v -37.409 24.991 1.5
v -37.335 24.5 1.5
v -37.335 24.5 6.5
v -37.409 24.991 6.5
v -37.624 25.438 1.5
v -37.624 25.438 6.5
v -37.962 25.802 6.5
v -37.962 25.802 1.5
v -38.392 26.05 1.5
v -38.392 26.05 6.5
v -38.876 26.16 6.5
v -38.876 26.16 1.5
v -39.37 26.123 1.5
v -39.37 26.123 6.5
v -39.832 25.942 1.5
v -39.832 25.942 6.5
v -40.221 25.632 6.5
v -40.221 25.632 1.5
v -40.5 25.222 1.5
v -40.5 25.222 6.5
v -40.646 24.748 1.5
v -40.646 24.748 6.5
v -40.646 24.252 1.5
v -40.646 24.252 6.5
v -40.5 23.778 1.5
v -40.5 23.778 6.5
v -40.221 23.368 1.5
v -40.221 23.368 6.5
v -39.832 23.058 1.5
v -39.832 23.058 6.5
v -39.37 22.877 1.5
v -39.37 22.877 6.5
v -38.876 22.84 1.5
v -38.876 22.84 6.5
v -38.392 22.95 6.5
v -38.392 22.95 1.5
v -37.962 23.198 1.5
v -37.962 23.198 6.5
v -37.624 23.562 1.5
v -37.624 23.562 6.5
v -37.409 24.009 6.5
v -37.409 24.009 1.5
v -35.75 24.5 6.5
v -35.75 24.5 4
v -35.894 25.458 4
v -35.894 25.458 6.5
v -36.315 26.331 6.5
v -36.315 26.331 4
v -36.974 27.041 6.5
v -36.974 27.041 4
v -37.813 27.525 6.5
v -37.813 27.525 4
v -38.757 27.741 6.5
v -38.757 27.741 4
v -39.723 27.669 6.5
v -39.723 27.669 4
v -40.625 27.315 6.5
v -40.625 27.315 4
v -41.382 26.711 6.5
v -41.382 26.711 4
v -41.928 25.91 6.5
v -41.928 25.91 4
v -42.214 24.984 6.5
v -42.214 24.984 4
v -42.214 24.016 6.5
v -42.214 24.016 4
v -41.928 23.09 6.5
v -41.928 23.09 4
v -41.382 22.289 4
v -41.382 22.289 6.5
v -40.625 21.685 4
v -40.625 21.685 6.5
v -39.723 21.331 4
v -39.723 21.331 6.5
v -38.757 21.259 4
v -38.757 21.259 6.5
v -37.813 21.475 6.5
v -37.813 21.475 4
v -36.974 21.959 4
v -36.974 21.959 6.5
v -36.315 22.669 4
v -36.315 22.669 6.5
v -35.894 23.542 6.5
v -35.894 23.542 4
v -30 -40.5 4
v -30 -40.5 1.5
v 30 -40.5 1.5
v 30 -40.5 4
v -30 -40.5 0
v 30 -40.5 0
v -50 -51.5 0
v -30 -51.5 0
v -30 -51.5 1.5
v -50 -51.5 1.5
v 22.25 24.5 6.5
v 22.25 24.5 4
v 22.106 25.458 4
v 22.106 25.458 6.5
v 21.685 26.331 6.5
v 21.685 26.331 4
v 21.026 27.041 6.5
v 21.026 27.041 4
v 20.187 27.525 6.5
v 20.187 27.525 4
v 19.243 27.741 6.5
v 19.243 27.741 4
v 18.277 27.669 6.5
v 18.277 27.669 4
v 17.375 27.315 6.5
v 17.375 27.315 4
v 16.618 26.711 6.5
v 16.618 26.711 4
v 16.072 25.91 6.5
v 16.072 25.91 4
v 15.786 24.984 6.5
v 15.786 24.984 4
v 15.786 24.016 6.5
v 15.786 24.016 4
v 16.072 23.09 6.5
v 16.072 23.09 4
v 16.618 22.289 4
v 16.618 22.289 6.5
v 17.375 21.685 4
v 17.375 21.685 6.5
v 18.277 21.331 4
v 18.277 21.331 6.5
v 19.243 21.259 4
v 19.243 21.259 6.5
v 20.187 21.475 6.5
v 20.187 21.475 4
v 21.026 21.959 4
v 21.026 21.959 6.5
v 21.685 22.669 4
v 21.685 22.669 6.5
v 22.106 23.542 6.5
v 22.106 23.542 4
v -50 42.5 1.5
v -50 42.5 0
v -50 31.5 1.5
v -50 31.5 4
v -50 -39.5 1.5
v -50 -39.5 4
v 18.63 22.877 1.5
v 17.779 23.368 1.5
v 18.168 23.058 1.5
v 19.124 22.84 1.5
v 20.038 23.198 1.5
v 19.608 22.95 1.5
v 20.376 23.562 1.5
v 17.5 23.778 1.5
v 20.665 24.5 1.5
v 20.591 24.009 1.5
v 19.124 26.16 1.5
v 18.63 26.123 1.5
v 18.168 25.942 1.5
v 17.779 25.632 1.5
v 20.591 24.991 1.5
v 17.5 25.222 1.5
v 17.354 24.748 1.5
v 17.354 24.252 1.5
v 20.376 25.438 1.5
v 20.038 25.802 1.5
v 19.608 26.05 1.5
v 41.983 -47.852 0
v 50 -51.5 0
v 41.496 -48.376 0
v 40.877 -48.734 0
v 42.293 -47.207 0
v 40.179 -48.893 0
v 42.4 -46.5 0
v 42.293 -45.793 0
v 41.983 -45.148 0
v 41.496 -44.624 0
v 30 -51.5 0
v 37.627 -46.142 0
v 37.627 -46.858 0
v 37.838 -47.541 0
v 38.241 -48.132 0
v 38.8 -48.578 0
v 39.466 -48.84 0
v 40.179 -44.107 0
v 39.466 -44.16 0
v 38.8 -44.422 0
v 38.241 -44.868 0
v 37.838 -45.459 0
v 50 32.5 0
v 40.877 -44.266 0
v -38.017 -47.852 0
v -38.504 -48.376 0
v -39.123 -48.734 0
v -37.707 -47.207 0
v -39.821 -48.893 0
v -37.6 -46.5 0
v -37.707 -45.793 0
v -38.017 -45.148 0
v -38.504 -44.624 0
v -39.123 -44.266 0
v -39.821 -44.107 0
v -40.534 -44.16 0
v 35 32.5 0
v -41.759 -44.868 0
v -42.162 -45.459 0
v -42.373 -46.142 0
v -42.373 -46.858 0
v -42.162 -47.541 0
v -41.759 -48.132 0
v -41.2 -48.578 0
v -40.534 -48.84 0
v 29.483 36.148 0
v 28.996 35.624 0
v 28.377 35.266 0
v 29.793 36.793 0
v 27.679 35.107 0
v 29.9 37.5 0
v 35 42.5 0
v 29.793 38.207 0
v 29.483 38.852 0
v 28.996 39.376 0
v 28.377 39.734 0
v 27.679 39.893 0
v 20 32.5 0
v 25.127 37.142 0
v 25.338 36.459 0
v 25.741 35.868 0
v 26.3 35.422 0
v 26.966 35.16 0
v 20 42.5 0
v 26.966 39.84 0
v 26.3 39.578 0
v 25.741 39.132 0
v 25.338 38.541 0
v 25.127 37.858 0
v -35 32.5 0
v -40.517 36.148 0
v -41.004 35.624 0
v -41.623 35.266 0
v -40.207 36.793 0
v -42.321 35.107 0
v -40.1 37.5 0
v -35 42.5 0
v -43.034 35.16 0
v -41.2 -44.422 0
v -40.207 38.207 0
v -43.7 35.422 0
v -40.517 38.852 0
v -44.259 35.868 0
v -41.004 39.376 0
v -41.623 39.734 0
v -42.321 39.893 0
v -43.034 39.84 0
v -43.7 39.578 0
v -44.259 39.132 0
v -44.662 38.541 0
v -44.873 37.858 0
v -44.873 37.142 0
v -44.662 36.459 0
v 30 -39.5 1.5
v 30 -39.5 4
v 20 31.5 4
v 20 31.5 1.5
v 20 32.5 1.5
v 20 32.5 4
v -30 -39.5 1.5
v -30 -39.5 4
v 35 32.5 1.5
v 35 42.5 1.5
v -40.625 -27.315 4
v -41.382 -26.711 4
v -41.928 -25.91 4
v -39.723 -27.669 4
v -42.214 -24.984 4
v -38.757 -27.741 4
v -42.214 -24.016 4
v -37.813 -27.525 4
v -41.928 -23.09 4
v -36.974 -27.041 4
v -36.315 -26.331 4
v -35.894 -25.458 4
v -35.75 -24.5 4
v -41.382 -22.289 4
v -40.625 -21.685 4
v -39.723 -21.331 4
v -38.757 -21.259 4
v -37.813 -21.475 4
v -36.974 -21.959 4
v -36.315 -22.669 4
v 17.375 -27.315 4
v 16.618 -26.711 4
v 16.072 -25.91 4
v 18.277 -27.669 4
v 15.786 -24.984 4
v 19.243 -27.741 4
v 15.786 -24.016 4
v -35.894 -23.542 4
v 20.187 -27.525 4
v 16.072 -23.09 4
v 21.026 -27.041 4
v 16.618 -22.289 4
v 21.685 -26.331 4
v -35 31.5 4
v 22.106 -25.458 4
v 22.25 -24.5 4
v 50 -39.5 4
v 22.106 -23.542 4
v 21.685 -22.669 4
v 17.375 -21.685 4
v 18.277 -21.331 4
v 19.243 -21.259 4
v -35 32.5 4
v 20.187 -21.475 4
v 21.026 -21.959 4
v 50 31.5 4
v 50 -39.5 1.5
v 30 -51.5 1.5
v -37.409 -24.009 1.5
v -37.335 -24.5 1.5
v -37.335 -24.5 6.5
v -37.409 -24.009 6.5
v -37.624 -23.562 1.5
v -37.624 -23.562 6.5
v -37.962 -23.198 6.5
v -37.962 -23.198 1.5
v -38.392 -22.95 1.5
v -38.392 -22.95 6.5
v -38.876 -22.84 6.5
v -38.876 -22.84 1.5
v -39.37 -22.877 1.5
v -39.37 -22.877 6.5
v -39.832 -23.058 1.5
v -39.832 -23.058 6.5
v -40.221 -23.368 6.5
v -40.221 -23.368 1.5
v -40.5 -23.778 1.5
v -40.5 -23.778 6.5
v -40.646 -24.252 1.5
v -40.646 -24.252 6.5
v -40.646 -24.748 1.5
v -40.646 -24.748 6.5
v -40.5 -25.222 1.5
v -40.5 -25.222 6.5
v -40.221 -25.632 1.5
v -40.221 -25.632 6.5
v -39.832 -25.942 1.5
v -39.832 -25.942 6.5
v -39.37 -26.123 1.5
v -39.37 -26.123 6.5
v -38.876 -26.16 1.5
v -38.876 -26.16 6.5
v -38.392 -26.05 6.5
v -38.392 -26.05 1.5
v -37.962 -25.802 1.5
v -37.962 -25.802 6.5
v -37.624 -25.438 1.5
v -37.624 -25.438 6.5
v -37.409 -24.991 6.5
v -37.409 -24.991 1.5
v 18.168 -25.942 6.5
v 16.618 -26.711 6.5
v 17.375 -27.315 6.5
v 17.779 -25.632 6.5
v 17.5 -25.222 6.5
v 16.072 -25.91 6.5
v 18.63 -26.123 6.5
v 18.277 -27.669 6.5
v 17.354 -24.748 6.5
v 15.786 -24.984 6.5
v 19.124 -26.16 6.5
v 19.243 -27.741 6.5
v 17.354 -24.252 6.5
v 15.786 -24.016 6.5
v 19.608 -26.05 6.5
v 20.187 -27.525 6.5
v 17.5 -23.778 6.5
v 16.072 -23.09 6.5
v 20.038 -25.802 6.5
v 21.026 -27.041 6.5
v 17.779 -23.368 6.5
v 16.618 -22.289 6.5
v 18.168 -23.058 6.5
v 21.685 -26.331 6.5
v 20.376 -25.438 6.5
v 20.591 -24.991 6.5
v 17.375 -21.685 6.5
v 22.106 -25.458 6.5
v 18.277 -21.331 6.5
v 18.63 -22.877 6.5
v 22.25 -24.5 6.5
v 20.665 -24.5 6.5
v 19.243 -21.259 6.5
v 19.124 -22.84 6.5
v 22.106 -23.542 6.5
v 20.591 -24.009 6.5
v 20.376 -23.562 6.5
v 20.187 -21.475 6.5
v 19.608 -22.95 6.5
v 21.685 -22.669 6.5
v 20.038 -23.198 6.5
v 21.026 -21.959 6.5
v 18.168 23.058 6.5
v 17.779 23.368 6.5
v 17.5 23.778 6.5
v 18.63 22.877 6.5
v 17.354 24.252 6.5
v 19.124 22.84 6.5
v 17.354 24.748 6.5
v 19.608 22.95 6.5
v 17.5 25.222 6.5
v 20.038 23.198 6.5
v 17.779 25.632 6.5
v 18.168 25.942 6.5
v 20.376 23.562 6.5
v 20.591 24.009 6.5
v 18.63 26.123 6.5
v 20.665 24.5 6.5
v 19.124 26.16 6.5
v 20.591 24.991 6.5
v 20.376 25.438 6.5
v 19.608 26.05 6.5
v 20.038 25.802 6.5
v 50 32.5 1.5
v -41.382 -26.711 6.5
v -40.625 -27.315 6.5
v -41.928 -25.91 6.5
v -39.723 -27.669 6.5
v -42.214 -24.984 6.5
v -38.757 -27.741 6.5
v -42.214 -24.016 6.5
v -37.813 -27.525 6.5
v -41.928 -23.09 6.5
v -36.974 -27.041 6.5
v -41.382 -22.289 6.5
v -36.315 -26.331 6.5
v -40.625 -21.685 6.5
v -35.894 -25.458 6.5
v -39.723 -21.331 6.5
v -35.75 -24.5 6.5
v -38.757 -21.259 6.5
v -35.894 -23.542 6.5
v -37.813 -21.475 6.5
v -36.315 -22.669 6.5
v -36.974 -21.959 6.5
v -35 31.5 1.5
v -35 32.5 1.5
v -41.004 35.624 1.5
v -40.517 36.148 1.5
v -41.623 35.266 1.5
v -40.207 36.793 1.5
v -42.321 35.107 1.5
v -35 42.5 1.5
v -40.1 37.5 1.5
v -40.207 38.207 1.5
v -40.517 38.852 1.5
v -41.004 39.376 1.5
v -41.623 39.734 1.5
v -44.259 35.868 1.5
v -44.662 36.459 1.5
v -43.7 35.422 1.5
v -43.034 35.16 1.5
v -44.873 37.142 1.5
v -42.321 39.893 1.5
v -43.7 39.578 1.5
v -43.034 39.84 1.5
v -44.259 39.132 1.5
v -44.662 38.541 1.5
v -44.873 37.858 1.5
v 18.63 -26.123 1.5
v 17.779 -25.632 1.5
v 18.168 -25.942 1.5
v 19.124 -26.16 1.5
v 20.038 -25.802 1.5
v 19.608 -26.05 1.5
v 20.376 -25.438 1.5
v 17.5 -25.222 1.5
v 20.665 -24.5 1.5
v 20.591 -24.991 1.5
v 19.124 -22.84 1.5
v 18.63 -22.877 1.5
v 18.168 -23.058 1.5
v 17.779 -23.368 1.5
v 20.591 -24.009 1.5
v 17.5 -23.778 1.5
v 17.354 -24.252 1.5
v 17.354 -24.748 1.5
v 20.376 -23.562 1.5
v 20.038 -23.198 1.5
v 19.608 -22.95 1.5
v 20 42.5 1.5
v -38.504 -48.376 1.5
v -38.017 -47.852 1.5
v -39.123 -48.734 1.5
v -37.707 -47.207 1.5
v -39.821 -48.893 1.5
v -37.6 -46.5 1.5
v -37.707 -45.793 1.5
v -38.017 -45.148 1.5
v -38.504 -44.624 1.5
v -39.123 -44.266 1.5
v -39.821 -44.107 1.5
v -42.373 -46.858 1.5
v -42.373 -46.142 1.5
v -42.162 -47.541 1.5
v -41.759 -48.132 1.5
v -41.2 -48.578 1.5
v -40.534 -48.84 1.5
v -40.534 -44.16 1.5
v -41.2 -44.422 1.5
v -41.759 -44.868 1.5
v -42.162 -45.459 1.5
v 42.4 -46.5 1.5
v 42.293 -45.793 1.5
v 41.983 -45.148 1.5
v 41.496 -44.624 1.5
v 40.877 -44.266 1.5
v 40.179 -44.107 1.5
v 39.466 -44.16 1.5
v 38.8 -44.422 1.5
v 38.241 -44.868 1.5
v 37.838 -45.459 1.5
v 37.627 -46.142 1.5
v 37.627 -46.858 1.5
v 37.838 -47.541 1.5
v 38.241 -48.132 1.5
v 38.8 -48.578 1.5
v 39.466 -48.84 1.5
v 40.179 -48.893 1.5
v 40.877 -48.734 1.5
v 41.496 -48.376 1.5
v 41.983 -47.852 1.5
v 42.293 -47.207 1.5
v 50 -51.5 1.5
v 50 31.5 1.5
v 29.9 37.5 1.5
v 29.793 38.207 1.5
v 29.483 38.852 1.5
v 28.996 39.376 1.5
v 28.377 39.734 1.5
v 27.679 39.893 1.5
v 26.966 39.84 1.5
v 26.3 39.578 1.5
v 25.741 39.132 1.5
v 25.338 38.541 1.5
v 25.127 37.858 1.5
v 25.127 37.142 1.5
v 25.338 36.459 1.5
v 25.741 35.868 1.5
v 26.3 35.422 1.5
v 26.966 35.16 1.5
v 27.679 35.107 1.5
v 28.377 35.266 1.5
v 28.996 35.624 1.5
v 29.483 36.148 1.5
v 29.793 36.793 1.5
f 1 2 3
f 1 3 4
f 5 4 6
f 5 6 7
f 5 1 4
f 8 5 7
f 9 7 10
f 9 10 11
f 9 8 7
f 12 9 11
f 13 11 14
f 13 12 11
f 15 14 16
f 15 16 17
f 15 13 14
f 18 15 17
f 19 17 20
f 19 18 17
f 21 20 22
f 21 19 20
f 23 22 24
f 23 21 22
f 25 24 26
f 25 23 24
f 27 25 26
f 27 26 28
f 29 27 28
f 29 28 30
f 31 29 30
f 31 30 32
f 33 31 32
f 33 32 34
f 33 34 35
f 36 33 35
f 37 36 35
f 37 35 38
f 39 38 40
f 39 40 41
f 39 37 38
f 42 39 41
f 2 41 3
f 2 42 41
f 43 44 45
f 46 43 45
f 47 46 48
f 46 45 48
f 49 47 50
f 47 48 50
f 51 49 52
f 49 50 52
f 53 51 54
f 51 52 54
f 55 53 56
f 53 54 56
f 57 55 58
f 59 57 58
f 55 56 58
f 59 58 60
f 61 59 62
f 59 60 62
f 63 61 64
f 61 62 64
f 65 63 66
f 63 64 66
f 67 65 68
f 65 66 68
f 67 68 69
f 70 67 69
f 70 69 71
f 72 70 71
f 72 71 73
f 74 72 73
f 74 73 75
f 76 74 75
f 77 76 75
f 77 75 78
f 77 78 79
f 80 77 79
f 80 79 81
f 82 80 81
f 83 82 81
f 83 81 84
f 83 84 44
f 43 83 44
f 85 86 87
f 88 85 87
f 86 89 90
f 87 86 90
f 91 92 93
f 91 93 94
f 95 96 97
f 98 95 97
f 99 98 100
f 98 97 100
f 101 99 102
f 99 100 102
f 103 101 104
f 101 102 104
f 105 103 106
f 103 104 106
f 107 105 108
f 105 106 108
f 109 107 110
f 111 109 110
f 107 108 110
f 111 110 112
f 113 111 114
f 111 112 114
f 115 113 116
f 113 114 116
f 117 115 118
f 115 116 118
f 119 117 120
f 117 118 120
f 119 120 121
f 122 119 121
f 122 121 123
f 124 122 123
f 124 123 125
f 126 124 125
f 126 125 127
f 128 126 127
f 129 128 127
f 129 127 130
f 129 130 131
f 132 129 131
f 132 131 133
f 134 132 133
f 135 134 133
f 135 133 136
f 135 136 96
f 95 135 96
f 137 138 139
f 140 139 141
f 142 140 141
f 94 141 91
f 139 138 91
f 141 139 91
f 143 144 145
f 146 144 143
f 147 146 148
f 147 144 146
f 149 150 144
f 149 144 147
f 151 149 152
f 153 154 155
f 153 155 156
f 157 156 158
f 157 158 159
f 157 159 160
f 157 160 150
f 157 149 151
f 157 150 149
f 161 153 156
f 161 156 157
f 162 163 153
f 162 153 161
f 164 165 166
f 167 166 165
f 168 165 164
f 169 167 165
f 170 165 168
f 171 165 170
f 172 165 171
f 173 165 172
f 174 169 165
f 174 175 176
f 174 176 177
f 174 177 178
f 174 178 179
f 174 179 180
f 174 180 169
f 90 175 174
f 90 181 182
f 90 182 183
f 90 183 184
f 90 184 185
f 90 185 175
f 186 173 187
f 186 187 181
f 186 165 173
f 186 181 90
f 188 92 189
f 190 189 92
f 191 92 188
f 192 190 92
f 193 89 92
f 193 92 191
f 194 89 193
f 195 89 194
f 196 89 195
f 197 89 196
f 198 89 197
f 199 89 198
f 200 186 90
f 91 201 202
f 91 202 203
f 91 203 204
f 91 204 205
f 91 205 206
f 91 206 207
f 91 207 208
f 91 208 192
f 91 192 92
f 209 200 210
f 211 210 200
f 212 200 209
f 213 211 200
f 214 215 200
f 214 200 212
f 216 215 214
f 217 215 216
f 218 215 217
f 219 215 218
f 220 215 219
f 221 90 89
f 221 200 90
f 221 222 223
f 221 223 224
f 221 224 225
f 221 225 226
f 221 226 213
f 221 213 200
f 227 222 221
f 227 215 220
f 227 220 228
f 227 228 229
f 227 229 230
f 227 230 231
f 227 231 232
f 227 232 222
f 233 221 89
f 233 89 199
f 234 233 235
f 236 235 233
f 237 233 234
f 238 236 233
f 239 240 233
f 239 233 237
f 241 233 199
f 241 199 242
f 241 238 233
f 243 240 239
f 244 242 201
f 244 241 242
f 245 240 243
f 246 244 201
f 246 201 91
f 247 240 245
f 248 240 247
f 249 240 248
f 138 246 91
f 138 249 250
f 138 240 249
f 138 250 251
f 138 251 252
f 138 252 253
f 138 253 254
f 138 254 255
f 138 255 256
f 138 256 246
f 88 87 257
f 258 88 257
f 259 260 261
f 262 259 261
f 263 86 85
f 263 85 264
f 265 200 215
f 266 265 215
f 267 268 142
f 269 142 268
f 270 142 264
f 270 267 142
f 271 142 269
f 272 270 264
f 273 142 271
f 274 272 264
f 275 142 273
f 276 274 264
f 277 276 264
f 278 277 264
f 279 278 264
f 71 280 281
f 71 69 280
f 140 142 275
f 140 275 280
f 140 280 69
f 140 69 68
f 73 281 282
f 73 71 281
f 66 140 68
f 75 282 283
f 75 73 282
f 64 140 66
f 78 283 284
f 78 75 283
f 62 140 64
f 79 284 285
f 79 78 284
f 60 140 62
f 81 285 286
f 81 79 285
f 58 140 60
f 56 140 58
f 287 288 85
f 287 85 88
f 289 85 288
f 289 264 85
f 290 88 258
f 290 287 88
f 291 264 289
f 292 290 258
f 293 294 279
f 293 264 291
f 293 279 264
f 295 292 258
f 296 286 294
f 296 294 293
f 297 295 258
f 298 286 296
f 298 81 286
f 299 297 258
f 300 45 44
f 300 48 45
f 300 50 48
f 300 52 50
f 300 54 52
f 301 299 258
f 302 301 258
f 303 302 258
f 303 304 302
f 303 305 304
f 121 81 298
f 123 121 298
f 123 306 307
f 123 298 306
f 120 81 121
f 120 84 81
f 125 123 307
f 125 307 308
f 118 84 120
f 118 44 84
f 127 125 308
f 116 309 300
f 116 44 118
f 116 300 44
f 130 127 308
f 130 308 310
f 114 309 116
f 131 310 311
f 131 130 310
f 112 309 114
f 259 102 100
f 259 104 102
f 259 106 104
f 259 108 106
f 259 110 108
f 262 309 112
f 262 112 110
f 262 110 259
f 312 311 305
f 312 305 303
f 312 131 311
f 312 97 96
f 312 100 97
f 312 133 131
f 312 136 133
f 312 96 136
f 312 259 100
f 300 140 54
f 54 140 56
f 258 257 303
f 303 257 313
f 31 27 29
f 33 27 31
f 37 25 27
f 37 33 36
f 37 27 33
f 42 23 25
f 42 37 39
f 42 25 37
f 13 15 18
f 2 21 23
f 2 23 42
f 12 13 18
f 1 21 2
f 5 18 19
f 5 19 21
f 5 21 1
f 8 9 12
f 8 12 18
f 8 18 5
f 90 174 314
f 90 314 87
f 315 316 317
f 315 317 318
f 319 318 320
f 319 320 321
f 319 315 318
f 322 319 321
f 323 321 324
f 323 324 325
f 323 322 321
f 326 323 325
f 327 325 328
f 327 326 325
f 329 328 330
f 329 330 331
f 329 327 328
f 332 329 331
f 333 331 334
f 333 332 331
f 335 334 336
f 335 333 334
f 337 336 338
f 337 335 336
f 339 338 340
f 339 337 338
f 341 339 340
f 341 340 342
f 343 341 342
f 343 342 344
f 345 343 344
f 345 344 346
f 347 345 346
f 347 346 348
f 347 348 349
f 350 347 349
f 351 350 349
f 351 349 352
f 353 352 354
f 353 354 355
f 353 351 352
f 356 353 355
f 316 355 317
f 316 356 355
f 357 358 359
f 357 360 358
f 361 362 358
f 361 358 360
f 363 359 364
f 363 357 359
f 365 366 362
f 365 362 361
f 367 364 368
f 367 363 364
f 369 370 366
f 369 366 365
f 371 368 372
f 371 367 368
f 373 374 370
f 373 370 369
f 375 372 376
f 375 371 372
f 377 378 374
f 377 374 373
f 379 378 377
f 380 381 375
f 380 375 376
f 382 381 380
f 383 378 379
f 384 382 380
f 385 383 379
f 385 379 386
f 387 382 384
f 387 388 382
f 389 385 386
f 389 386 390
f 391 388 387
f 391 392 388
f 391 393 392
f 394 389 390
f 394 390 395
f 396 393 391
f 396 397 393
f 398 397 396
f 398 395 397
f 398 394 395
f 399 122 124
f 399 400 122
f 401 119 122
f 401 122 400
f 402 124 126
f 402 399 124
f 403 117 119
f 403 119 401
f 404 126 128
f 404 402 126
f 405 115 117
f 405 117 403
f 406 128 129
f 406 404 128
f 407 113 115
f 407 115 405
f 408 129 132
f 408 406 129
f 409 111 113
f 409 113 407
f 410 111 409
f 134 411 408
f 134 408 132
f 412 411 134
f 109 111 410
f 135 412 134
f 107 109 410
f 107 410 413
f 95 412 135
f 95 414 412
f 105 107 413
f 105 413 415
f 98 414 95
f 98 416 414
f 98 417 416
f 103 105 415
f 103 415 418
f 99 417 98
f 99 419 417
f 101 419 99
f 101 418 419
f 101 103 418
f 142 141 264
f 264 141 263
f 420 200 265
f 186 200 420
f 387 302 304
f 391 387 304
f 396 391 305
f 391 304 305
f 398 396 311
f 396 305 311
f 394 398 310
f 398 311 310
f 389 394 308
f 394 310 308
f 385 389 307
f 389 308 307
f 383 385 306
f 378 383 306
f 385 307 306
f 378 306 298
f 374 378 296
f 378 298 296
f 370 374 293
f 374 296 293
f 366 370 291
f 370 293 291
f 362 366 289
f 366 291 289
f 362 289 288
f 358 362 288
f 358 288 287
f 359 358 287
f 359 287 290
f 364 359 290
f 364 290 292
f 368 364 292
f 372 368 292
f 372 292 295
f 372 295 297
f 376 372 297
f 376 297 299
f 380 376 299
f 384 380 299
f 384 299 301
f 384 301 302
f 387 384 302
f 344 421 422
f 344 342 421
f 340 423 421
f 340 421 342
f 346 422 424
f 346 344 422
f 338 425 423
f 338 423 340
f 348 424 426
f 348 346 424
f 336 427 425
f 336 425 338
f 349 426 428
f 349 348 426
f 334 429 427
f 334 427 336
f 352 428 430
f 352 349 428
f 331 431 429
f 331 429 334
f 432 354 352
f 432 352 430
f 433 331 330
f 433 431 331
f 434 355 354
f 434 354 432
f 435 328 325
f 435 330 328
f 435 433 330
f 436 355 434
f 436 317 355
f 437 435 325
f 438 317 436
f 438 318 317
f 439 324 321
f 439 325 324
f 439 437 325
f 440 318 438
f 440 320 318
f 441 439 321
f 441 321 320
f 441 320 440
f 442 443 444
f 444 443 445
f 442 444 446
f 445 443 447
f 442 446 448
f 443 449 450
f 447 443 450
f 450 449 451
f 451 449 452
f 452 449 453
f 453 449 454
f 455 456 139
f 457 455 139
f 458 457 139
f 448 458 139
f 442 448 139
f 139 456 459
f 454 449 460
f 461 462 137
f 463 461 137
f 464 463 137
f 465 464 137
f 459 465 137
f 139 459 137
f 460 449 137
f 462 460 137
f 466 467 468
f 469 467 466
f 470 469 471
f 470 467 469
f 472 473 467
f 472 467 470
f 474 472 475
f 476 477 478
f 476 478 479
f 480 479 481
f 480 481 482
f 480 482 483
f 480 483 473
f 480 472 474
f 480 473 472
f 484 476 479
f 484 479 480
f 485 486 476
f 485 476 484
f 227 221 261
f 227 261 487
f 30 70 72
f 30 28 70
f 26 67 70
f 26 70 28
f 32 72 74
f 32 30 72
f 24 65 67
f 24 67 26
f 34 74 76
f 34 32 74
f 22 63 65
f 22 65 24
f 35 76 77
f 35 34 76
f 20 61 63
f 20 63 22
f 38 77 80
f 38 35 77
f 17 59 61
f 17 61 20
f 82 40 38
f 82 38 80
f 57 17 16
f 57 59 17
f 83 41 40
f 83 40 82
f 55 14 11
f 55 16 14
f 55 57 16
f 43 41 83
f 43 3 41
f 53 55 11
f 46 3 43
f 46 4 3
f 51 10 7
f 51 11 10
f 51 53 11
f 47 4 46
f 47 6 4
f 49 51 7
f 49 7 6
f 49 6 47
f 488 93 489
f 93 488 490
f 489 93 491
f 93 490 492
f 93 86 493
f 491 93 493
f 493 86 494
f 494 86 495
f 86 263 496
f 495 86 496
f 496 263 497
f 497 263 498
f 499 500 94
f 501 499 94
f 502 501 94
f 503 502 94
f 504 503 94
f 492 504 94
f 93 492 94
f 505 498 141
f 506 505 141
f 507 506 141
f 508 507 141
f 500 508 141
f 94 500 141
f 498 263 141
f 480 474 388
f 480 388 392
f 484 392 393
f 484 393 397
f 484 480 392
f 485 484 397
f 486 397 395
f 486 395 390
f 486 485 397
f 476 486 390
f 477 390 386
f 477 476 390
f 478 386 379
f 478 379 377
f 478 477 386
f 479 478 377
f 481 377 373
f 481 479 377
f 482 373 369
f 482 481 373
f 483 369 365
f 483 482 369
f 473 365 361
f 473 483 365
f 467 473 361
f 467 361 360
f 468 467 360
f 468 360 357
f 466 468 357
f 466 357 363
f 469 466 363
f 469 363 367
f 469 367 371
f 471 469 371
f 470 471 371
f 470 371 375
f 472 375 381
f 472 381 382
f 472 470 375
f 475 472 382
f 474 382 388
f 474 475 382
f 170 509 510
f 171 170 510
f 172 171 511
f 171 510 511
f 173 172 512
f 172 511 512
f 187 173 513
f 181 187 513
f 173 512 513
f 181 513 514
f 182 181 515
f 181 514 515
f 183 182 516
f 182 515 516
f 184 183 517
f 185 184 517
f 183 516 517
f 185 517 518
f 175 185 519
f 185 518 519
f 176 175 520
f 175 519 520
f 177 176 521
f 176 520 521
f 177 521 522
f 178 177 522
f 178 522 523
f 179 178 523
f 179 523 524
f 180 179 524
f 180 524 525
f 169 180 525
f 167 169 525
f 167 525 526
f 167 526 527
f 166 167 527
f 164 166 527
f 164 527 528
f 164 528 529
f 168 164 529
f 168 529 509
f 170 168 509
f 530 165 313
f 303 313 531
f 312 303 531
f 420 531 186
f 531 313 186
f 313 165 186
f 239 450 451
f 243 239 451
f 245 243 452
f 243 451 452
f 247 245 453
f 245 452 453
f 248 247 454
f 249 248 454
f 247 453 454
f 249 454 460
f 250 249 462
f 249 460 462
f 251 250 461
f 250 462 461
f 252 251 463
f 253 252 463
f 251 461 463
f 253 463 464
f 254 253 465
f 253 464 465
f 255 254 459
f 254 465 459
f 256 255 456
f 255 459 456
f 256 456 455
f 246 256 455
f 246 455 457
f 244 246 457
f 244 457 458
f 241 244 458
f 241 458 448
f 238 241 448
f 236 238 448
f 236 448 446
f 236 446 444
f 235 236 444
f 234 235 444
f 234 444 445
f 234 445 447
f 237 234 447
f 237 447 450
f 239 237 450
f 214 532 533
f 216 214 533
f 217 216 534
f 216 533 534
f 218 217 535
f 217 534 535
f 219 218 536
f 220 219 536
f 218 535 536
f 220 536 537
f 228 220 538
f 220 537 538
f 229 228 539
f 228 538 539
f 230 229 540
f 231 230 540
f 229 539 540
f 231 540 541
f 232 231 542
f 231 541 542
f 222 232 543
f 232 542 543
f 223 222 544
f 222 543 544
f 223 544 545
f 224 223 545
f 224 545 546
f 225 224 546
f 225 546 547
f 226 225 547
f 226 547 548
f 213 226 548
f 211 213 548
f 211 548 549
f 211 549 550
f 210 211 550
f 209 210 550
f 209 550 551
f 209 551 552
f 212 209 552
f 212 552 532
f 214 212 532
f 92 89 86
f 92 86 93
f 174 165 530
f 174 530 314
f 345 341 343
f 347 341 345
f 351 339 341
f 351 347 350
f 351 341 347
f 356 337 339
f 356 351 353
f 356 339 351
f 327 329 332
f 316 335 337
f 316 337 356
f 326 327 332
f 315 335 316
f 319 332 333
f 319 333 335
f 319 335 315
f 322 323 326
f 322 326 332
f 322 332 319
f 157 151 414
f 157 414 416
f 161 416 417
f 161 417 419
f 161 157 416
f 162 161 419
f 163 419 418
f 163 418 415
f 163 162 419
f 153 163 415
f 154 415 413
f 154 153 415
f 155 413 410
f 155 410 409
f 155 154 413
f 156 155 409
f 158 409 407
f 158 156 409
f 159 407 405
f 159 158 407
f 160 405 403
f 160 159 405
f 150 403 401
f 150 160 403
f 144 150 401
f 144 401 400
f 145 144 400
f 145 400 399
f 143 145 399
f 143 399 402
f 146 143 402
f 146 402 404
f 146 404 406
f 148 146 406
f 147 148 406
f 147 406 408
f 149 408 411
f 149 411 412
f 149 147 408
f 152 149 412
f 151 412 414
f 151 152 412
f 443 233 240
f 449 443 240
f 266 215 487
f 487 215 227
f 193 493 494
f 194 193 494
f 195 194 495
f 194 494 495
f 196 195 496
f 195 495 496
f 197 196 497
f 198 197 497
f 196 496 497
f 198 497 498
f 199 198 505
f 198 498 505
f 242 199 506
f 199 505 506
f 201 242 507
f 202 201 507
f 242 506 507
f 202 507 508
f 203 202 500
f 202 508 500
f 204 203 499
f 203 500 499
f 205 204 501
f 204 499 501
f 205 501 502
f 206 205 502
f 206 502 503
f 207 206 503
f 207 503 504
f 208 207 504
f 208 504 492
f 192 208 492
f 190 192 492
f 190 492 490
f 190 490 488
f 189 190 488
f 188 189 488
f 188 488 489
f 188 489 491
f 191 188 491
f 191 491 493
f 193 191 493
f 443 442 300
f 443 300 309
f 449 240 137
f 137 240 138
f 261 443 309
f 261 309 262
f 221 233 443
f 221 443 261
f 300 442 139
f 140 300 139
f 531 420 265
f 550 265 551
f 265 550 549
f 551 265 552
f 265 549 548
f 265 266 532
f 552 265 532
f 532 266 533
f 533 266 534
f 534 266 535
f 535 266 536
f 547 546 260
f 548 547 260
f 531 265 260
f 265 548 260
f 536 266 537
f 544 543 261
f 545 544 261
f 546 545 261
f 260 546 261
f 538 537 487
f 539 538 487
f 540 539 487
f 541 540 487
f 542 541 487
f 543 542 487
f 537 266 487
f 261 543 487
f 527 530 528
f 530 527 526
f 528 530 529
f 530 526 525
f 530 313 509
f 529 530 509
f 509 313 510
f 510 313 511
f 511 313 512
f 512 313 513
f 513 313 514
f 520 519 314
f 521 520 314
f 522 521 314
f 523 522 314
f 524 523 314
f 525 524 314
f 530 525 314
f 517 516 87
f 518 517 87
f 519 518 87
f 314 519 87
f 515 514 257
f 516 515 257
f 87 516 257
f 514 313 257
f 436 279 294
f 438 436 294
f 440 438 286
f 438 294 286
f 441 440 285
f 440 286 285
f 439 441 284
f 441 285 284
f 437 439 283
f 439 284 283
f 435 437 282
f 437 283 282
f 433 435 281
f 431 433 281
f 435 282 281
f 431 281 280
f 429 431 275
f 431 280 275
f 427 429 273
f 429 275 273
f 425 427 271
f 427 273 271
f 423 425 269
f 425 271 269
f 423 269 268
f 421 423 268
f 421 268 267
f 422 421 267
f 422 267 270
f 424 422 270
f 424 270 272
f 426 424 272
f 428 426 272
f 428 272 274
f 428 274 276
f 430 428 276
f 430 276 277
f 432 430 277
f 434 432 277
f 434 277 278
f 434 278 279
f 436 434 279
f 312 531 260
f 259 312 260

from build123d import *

# Parameters (mm, degrees)
SKETCH1_W            = 100
SKETCH1_H            = 65
BOSS_EXTRUDE1_DEPTH  = 1.5
SKETCH2_R            = 3.25
SKETCH2_R_2          = 1.665
BOSS_EXTRUDE2_DEPTH  = 5
SKETCH4_W            = 15
SKETCH4_H            = 10
BOSS_EXTRUDE3_DEPTH  = 1.5
M4_CLEARANCE_HOLE1_D = 4.8
SKETCH8_R            = 3.25
SKETCH8_W            = 55
SKETCH8_H            = 1
SKETCH8_W_2          = 60
BOSS_EXTRUDE4_DEPTH  = 2.5


with BuildPart() as part:
    # Sketch1 → Boss-Extrude1 (new body)
    with BuildSketch(Plane.XY):
        Rectangle(SKETCH1_W, SKETCH1_H)
    extrude(amount=BOSS_EXTRUDE1_DEPTH)

    # Sketch2 → Boss-Extrude2 (add)
    # profile 1 of 4: a face of its own
    with BuildSketch(Plane.XY.offset(1.5)):
        with Locations((-39, 24.5)):
            Circle(SKETCH2_R)
        with Locations((-39, 24.5)):
            Circle(SKETCH2_R_2, mode=Mode.SUBTRACT)
    # profile 2 of 4: a face of its own
    with BuildSketch(Plane.XY.offset(1.5)):
        with Locations((19, 24.5)):
            Circle(SKETCH2_R)
        with Locations((19, 24.5)):
            Circle(SKETCH2_R_2, mode=Mode.SUBTRACT)
    # profile 3 of 4: a face of its own
    with BuildSketch(Plane.XY.offset(1.5)):
        with Locations((19, -24.5)):
            Circle(SKETCH2_R)
        with Locations((19, -24.5)):
            Circle(SKETCH2_R_2, mode=Mode.SUBTRACT)
    # profile 4 of 4: a face of its own
    with BuildSketch(Plane.XY.offset(1.5)):
        with Locations((-39, -24.5)):
            Circle(SKETCH2_R)
        with Locations((-39, -24.5)):
            Circle(SKETCH2_R_2, mode=Mode.SUBTRACT)
    extrude(amount=BOSS_EXTRUDE2_DEPTH)

    # Sketch4 → Boss-Extrude3 (add)
    with BuildSketch(Plane(origin=(0, 0, 0), x_dir=(-1, 0, 0), z_dir=(0, 0, -1))):
        Polygon((-50, -32.5), (-50, -51.5), (-30, -51.5), (-30, -40.5), (30, -40.5), (30, -51.5), (50, -51.5), (50, -32.5), align=None)
        with Locations((-27.5, 37.5)):
            Rectangle(SKETCH4_W, SKETCH4_H)
        with Locations((42.5, 37.5)):
            Rectangle(SKETCH4_W, SKETCH4_H)
    extrude(amount=-BOSS_EXTRUDE3_DEPTH)

    # M4 Clearance Hole1 (through all)
    with Locations(Plane(origin=(0, 0, 0), x_dir=(-1, 0, 0), z_dir=(0, 0, -1))):
        with Locations((-40, -46.5), (40, -46.5), (42.5, 37.5), (-27.5, 37.5)):
            Hole(M4_CLEARANCE_HOLE1_D / 2)

    # Sketch8 → Boss-Extrude4 (add)
    # profile 1 of 3: a face of its own
    with BuildSketch(Plane.XY.offset(1.5)):
        Polygon((-35, 31.5), (-50, 31.5), (-50, -39.5), (-30, -39.5), (30, -39.5), (50, -39.5), (50, 31.5), (35, 31.5), (20, 31.5), align=None)
        with Locations((-39, -24.5)):
            Circle(SKETCH8_R, mode=Mode.SUBTRACT)
        with Locations((19, -24.5)):
            Circle(SKETCH8_R, mode=Mode.SUBTRACT)
        with Locations((-39, 24.5)):
            Circle(SKETCH8_R, mode=Mode.SUBTRACT)
        with Locations((19, 24.5)):
            Circle(SKETCH8_R, mode=Mode.SUBTRACT)
    # profile 2 of 3: a face of its own
    with BuildSketch(Plane.XY.offset(1.5)):
        with Locations((-7.5, 32)):
            Rectangle(SKETCH8_W, SKETCH8_H)
    # profile 3 of 3: a face of its own
    with BuildSketch(Plane.XY.offset(1.5)):
        with Locations((0, -40)):
            Rectangle(SKETCH8_W_2, SKETCH8_H)
    extrude(amount=BOSS_EXTRUDE4_DEPTH)


solid = part.part
